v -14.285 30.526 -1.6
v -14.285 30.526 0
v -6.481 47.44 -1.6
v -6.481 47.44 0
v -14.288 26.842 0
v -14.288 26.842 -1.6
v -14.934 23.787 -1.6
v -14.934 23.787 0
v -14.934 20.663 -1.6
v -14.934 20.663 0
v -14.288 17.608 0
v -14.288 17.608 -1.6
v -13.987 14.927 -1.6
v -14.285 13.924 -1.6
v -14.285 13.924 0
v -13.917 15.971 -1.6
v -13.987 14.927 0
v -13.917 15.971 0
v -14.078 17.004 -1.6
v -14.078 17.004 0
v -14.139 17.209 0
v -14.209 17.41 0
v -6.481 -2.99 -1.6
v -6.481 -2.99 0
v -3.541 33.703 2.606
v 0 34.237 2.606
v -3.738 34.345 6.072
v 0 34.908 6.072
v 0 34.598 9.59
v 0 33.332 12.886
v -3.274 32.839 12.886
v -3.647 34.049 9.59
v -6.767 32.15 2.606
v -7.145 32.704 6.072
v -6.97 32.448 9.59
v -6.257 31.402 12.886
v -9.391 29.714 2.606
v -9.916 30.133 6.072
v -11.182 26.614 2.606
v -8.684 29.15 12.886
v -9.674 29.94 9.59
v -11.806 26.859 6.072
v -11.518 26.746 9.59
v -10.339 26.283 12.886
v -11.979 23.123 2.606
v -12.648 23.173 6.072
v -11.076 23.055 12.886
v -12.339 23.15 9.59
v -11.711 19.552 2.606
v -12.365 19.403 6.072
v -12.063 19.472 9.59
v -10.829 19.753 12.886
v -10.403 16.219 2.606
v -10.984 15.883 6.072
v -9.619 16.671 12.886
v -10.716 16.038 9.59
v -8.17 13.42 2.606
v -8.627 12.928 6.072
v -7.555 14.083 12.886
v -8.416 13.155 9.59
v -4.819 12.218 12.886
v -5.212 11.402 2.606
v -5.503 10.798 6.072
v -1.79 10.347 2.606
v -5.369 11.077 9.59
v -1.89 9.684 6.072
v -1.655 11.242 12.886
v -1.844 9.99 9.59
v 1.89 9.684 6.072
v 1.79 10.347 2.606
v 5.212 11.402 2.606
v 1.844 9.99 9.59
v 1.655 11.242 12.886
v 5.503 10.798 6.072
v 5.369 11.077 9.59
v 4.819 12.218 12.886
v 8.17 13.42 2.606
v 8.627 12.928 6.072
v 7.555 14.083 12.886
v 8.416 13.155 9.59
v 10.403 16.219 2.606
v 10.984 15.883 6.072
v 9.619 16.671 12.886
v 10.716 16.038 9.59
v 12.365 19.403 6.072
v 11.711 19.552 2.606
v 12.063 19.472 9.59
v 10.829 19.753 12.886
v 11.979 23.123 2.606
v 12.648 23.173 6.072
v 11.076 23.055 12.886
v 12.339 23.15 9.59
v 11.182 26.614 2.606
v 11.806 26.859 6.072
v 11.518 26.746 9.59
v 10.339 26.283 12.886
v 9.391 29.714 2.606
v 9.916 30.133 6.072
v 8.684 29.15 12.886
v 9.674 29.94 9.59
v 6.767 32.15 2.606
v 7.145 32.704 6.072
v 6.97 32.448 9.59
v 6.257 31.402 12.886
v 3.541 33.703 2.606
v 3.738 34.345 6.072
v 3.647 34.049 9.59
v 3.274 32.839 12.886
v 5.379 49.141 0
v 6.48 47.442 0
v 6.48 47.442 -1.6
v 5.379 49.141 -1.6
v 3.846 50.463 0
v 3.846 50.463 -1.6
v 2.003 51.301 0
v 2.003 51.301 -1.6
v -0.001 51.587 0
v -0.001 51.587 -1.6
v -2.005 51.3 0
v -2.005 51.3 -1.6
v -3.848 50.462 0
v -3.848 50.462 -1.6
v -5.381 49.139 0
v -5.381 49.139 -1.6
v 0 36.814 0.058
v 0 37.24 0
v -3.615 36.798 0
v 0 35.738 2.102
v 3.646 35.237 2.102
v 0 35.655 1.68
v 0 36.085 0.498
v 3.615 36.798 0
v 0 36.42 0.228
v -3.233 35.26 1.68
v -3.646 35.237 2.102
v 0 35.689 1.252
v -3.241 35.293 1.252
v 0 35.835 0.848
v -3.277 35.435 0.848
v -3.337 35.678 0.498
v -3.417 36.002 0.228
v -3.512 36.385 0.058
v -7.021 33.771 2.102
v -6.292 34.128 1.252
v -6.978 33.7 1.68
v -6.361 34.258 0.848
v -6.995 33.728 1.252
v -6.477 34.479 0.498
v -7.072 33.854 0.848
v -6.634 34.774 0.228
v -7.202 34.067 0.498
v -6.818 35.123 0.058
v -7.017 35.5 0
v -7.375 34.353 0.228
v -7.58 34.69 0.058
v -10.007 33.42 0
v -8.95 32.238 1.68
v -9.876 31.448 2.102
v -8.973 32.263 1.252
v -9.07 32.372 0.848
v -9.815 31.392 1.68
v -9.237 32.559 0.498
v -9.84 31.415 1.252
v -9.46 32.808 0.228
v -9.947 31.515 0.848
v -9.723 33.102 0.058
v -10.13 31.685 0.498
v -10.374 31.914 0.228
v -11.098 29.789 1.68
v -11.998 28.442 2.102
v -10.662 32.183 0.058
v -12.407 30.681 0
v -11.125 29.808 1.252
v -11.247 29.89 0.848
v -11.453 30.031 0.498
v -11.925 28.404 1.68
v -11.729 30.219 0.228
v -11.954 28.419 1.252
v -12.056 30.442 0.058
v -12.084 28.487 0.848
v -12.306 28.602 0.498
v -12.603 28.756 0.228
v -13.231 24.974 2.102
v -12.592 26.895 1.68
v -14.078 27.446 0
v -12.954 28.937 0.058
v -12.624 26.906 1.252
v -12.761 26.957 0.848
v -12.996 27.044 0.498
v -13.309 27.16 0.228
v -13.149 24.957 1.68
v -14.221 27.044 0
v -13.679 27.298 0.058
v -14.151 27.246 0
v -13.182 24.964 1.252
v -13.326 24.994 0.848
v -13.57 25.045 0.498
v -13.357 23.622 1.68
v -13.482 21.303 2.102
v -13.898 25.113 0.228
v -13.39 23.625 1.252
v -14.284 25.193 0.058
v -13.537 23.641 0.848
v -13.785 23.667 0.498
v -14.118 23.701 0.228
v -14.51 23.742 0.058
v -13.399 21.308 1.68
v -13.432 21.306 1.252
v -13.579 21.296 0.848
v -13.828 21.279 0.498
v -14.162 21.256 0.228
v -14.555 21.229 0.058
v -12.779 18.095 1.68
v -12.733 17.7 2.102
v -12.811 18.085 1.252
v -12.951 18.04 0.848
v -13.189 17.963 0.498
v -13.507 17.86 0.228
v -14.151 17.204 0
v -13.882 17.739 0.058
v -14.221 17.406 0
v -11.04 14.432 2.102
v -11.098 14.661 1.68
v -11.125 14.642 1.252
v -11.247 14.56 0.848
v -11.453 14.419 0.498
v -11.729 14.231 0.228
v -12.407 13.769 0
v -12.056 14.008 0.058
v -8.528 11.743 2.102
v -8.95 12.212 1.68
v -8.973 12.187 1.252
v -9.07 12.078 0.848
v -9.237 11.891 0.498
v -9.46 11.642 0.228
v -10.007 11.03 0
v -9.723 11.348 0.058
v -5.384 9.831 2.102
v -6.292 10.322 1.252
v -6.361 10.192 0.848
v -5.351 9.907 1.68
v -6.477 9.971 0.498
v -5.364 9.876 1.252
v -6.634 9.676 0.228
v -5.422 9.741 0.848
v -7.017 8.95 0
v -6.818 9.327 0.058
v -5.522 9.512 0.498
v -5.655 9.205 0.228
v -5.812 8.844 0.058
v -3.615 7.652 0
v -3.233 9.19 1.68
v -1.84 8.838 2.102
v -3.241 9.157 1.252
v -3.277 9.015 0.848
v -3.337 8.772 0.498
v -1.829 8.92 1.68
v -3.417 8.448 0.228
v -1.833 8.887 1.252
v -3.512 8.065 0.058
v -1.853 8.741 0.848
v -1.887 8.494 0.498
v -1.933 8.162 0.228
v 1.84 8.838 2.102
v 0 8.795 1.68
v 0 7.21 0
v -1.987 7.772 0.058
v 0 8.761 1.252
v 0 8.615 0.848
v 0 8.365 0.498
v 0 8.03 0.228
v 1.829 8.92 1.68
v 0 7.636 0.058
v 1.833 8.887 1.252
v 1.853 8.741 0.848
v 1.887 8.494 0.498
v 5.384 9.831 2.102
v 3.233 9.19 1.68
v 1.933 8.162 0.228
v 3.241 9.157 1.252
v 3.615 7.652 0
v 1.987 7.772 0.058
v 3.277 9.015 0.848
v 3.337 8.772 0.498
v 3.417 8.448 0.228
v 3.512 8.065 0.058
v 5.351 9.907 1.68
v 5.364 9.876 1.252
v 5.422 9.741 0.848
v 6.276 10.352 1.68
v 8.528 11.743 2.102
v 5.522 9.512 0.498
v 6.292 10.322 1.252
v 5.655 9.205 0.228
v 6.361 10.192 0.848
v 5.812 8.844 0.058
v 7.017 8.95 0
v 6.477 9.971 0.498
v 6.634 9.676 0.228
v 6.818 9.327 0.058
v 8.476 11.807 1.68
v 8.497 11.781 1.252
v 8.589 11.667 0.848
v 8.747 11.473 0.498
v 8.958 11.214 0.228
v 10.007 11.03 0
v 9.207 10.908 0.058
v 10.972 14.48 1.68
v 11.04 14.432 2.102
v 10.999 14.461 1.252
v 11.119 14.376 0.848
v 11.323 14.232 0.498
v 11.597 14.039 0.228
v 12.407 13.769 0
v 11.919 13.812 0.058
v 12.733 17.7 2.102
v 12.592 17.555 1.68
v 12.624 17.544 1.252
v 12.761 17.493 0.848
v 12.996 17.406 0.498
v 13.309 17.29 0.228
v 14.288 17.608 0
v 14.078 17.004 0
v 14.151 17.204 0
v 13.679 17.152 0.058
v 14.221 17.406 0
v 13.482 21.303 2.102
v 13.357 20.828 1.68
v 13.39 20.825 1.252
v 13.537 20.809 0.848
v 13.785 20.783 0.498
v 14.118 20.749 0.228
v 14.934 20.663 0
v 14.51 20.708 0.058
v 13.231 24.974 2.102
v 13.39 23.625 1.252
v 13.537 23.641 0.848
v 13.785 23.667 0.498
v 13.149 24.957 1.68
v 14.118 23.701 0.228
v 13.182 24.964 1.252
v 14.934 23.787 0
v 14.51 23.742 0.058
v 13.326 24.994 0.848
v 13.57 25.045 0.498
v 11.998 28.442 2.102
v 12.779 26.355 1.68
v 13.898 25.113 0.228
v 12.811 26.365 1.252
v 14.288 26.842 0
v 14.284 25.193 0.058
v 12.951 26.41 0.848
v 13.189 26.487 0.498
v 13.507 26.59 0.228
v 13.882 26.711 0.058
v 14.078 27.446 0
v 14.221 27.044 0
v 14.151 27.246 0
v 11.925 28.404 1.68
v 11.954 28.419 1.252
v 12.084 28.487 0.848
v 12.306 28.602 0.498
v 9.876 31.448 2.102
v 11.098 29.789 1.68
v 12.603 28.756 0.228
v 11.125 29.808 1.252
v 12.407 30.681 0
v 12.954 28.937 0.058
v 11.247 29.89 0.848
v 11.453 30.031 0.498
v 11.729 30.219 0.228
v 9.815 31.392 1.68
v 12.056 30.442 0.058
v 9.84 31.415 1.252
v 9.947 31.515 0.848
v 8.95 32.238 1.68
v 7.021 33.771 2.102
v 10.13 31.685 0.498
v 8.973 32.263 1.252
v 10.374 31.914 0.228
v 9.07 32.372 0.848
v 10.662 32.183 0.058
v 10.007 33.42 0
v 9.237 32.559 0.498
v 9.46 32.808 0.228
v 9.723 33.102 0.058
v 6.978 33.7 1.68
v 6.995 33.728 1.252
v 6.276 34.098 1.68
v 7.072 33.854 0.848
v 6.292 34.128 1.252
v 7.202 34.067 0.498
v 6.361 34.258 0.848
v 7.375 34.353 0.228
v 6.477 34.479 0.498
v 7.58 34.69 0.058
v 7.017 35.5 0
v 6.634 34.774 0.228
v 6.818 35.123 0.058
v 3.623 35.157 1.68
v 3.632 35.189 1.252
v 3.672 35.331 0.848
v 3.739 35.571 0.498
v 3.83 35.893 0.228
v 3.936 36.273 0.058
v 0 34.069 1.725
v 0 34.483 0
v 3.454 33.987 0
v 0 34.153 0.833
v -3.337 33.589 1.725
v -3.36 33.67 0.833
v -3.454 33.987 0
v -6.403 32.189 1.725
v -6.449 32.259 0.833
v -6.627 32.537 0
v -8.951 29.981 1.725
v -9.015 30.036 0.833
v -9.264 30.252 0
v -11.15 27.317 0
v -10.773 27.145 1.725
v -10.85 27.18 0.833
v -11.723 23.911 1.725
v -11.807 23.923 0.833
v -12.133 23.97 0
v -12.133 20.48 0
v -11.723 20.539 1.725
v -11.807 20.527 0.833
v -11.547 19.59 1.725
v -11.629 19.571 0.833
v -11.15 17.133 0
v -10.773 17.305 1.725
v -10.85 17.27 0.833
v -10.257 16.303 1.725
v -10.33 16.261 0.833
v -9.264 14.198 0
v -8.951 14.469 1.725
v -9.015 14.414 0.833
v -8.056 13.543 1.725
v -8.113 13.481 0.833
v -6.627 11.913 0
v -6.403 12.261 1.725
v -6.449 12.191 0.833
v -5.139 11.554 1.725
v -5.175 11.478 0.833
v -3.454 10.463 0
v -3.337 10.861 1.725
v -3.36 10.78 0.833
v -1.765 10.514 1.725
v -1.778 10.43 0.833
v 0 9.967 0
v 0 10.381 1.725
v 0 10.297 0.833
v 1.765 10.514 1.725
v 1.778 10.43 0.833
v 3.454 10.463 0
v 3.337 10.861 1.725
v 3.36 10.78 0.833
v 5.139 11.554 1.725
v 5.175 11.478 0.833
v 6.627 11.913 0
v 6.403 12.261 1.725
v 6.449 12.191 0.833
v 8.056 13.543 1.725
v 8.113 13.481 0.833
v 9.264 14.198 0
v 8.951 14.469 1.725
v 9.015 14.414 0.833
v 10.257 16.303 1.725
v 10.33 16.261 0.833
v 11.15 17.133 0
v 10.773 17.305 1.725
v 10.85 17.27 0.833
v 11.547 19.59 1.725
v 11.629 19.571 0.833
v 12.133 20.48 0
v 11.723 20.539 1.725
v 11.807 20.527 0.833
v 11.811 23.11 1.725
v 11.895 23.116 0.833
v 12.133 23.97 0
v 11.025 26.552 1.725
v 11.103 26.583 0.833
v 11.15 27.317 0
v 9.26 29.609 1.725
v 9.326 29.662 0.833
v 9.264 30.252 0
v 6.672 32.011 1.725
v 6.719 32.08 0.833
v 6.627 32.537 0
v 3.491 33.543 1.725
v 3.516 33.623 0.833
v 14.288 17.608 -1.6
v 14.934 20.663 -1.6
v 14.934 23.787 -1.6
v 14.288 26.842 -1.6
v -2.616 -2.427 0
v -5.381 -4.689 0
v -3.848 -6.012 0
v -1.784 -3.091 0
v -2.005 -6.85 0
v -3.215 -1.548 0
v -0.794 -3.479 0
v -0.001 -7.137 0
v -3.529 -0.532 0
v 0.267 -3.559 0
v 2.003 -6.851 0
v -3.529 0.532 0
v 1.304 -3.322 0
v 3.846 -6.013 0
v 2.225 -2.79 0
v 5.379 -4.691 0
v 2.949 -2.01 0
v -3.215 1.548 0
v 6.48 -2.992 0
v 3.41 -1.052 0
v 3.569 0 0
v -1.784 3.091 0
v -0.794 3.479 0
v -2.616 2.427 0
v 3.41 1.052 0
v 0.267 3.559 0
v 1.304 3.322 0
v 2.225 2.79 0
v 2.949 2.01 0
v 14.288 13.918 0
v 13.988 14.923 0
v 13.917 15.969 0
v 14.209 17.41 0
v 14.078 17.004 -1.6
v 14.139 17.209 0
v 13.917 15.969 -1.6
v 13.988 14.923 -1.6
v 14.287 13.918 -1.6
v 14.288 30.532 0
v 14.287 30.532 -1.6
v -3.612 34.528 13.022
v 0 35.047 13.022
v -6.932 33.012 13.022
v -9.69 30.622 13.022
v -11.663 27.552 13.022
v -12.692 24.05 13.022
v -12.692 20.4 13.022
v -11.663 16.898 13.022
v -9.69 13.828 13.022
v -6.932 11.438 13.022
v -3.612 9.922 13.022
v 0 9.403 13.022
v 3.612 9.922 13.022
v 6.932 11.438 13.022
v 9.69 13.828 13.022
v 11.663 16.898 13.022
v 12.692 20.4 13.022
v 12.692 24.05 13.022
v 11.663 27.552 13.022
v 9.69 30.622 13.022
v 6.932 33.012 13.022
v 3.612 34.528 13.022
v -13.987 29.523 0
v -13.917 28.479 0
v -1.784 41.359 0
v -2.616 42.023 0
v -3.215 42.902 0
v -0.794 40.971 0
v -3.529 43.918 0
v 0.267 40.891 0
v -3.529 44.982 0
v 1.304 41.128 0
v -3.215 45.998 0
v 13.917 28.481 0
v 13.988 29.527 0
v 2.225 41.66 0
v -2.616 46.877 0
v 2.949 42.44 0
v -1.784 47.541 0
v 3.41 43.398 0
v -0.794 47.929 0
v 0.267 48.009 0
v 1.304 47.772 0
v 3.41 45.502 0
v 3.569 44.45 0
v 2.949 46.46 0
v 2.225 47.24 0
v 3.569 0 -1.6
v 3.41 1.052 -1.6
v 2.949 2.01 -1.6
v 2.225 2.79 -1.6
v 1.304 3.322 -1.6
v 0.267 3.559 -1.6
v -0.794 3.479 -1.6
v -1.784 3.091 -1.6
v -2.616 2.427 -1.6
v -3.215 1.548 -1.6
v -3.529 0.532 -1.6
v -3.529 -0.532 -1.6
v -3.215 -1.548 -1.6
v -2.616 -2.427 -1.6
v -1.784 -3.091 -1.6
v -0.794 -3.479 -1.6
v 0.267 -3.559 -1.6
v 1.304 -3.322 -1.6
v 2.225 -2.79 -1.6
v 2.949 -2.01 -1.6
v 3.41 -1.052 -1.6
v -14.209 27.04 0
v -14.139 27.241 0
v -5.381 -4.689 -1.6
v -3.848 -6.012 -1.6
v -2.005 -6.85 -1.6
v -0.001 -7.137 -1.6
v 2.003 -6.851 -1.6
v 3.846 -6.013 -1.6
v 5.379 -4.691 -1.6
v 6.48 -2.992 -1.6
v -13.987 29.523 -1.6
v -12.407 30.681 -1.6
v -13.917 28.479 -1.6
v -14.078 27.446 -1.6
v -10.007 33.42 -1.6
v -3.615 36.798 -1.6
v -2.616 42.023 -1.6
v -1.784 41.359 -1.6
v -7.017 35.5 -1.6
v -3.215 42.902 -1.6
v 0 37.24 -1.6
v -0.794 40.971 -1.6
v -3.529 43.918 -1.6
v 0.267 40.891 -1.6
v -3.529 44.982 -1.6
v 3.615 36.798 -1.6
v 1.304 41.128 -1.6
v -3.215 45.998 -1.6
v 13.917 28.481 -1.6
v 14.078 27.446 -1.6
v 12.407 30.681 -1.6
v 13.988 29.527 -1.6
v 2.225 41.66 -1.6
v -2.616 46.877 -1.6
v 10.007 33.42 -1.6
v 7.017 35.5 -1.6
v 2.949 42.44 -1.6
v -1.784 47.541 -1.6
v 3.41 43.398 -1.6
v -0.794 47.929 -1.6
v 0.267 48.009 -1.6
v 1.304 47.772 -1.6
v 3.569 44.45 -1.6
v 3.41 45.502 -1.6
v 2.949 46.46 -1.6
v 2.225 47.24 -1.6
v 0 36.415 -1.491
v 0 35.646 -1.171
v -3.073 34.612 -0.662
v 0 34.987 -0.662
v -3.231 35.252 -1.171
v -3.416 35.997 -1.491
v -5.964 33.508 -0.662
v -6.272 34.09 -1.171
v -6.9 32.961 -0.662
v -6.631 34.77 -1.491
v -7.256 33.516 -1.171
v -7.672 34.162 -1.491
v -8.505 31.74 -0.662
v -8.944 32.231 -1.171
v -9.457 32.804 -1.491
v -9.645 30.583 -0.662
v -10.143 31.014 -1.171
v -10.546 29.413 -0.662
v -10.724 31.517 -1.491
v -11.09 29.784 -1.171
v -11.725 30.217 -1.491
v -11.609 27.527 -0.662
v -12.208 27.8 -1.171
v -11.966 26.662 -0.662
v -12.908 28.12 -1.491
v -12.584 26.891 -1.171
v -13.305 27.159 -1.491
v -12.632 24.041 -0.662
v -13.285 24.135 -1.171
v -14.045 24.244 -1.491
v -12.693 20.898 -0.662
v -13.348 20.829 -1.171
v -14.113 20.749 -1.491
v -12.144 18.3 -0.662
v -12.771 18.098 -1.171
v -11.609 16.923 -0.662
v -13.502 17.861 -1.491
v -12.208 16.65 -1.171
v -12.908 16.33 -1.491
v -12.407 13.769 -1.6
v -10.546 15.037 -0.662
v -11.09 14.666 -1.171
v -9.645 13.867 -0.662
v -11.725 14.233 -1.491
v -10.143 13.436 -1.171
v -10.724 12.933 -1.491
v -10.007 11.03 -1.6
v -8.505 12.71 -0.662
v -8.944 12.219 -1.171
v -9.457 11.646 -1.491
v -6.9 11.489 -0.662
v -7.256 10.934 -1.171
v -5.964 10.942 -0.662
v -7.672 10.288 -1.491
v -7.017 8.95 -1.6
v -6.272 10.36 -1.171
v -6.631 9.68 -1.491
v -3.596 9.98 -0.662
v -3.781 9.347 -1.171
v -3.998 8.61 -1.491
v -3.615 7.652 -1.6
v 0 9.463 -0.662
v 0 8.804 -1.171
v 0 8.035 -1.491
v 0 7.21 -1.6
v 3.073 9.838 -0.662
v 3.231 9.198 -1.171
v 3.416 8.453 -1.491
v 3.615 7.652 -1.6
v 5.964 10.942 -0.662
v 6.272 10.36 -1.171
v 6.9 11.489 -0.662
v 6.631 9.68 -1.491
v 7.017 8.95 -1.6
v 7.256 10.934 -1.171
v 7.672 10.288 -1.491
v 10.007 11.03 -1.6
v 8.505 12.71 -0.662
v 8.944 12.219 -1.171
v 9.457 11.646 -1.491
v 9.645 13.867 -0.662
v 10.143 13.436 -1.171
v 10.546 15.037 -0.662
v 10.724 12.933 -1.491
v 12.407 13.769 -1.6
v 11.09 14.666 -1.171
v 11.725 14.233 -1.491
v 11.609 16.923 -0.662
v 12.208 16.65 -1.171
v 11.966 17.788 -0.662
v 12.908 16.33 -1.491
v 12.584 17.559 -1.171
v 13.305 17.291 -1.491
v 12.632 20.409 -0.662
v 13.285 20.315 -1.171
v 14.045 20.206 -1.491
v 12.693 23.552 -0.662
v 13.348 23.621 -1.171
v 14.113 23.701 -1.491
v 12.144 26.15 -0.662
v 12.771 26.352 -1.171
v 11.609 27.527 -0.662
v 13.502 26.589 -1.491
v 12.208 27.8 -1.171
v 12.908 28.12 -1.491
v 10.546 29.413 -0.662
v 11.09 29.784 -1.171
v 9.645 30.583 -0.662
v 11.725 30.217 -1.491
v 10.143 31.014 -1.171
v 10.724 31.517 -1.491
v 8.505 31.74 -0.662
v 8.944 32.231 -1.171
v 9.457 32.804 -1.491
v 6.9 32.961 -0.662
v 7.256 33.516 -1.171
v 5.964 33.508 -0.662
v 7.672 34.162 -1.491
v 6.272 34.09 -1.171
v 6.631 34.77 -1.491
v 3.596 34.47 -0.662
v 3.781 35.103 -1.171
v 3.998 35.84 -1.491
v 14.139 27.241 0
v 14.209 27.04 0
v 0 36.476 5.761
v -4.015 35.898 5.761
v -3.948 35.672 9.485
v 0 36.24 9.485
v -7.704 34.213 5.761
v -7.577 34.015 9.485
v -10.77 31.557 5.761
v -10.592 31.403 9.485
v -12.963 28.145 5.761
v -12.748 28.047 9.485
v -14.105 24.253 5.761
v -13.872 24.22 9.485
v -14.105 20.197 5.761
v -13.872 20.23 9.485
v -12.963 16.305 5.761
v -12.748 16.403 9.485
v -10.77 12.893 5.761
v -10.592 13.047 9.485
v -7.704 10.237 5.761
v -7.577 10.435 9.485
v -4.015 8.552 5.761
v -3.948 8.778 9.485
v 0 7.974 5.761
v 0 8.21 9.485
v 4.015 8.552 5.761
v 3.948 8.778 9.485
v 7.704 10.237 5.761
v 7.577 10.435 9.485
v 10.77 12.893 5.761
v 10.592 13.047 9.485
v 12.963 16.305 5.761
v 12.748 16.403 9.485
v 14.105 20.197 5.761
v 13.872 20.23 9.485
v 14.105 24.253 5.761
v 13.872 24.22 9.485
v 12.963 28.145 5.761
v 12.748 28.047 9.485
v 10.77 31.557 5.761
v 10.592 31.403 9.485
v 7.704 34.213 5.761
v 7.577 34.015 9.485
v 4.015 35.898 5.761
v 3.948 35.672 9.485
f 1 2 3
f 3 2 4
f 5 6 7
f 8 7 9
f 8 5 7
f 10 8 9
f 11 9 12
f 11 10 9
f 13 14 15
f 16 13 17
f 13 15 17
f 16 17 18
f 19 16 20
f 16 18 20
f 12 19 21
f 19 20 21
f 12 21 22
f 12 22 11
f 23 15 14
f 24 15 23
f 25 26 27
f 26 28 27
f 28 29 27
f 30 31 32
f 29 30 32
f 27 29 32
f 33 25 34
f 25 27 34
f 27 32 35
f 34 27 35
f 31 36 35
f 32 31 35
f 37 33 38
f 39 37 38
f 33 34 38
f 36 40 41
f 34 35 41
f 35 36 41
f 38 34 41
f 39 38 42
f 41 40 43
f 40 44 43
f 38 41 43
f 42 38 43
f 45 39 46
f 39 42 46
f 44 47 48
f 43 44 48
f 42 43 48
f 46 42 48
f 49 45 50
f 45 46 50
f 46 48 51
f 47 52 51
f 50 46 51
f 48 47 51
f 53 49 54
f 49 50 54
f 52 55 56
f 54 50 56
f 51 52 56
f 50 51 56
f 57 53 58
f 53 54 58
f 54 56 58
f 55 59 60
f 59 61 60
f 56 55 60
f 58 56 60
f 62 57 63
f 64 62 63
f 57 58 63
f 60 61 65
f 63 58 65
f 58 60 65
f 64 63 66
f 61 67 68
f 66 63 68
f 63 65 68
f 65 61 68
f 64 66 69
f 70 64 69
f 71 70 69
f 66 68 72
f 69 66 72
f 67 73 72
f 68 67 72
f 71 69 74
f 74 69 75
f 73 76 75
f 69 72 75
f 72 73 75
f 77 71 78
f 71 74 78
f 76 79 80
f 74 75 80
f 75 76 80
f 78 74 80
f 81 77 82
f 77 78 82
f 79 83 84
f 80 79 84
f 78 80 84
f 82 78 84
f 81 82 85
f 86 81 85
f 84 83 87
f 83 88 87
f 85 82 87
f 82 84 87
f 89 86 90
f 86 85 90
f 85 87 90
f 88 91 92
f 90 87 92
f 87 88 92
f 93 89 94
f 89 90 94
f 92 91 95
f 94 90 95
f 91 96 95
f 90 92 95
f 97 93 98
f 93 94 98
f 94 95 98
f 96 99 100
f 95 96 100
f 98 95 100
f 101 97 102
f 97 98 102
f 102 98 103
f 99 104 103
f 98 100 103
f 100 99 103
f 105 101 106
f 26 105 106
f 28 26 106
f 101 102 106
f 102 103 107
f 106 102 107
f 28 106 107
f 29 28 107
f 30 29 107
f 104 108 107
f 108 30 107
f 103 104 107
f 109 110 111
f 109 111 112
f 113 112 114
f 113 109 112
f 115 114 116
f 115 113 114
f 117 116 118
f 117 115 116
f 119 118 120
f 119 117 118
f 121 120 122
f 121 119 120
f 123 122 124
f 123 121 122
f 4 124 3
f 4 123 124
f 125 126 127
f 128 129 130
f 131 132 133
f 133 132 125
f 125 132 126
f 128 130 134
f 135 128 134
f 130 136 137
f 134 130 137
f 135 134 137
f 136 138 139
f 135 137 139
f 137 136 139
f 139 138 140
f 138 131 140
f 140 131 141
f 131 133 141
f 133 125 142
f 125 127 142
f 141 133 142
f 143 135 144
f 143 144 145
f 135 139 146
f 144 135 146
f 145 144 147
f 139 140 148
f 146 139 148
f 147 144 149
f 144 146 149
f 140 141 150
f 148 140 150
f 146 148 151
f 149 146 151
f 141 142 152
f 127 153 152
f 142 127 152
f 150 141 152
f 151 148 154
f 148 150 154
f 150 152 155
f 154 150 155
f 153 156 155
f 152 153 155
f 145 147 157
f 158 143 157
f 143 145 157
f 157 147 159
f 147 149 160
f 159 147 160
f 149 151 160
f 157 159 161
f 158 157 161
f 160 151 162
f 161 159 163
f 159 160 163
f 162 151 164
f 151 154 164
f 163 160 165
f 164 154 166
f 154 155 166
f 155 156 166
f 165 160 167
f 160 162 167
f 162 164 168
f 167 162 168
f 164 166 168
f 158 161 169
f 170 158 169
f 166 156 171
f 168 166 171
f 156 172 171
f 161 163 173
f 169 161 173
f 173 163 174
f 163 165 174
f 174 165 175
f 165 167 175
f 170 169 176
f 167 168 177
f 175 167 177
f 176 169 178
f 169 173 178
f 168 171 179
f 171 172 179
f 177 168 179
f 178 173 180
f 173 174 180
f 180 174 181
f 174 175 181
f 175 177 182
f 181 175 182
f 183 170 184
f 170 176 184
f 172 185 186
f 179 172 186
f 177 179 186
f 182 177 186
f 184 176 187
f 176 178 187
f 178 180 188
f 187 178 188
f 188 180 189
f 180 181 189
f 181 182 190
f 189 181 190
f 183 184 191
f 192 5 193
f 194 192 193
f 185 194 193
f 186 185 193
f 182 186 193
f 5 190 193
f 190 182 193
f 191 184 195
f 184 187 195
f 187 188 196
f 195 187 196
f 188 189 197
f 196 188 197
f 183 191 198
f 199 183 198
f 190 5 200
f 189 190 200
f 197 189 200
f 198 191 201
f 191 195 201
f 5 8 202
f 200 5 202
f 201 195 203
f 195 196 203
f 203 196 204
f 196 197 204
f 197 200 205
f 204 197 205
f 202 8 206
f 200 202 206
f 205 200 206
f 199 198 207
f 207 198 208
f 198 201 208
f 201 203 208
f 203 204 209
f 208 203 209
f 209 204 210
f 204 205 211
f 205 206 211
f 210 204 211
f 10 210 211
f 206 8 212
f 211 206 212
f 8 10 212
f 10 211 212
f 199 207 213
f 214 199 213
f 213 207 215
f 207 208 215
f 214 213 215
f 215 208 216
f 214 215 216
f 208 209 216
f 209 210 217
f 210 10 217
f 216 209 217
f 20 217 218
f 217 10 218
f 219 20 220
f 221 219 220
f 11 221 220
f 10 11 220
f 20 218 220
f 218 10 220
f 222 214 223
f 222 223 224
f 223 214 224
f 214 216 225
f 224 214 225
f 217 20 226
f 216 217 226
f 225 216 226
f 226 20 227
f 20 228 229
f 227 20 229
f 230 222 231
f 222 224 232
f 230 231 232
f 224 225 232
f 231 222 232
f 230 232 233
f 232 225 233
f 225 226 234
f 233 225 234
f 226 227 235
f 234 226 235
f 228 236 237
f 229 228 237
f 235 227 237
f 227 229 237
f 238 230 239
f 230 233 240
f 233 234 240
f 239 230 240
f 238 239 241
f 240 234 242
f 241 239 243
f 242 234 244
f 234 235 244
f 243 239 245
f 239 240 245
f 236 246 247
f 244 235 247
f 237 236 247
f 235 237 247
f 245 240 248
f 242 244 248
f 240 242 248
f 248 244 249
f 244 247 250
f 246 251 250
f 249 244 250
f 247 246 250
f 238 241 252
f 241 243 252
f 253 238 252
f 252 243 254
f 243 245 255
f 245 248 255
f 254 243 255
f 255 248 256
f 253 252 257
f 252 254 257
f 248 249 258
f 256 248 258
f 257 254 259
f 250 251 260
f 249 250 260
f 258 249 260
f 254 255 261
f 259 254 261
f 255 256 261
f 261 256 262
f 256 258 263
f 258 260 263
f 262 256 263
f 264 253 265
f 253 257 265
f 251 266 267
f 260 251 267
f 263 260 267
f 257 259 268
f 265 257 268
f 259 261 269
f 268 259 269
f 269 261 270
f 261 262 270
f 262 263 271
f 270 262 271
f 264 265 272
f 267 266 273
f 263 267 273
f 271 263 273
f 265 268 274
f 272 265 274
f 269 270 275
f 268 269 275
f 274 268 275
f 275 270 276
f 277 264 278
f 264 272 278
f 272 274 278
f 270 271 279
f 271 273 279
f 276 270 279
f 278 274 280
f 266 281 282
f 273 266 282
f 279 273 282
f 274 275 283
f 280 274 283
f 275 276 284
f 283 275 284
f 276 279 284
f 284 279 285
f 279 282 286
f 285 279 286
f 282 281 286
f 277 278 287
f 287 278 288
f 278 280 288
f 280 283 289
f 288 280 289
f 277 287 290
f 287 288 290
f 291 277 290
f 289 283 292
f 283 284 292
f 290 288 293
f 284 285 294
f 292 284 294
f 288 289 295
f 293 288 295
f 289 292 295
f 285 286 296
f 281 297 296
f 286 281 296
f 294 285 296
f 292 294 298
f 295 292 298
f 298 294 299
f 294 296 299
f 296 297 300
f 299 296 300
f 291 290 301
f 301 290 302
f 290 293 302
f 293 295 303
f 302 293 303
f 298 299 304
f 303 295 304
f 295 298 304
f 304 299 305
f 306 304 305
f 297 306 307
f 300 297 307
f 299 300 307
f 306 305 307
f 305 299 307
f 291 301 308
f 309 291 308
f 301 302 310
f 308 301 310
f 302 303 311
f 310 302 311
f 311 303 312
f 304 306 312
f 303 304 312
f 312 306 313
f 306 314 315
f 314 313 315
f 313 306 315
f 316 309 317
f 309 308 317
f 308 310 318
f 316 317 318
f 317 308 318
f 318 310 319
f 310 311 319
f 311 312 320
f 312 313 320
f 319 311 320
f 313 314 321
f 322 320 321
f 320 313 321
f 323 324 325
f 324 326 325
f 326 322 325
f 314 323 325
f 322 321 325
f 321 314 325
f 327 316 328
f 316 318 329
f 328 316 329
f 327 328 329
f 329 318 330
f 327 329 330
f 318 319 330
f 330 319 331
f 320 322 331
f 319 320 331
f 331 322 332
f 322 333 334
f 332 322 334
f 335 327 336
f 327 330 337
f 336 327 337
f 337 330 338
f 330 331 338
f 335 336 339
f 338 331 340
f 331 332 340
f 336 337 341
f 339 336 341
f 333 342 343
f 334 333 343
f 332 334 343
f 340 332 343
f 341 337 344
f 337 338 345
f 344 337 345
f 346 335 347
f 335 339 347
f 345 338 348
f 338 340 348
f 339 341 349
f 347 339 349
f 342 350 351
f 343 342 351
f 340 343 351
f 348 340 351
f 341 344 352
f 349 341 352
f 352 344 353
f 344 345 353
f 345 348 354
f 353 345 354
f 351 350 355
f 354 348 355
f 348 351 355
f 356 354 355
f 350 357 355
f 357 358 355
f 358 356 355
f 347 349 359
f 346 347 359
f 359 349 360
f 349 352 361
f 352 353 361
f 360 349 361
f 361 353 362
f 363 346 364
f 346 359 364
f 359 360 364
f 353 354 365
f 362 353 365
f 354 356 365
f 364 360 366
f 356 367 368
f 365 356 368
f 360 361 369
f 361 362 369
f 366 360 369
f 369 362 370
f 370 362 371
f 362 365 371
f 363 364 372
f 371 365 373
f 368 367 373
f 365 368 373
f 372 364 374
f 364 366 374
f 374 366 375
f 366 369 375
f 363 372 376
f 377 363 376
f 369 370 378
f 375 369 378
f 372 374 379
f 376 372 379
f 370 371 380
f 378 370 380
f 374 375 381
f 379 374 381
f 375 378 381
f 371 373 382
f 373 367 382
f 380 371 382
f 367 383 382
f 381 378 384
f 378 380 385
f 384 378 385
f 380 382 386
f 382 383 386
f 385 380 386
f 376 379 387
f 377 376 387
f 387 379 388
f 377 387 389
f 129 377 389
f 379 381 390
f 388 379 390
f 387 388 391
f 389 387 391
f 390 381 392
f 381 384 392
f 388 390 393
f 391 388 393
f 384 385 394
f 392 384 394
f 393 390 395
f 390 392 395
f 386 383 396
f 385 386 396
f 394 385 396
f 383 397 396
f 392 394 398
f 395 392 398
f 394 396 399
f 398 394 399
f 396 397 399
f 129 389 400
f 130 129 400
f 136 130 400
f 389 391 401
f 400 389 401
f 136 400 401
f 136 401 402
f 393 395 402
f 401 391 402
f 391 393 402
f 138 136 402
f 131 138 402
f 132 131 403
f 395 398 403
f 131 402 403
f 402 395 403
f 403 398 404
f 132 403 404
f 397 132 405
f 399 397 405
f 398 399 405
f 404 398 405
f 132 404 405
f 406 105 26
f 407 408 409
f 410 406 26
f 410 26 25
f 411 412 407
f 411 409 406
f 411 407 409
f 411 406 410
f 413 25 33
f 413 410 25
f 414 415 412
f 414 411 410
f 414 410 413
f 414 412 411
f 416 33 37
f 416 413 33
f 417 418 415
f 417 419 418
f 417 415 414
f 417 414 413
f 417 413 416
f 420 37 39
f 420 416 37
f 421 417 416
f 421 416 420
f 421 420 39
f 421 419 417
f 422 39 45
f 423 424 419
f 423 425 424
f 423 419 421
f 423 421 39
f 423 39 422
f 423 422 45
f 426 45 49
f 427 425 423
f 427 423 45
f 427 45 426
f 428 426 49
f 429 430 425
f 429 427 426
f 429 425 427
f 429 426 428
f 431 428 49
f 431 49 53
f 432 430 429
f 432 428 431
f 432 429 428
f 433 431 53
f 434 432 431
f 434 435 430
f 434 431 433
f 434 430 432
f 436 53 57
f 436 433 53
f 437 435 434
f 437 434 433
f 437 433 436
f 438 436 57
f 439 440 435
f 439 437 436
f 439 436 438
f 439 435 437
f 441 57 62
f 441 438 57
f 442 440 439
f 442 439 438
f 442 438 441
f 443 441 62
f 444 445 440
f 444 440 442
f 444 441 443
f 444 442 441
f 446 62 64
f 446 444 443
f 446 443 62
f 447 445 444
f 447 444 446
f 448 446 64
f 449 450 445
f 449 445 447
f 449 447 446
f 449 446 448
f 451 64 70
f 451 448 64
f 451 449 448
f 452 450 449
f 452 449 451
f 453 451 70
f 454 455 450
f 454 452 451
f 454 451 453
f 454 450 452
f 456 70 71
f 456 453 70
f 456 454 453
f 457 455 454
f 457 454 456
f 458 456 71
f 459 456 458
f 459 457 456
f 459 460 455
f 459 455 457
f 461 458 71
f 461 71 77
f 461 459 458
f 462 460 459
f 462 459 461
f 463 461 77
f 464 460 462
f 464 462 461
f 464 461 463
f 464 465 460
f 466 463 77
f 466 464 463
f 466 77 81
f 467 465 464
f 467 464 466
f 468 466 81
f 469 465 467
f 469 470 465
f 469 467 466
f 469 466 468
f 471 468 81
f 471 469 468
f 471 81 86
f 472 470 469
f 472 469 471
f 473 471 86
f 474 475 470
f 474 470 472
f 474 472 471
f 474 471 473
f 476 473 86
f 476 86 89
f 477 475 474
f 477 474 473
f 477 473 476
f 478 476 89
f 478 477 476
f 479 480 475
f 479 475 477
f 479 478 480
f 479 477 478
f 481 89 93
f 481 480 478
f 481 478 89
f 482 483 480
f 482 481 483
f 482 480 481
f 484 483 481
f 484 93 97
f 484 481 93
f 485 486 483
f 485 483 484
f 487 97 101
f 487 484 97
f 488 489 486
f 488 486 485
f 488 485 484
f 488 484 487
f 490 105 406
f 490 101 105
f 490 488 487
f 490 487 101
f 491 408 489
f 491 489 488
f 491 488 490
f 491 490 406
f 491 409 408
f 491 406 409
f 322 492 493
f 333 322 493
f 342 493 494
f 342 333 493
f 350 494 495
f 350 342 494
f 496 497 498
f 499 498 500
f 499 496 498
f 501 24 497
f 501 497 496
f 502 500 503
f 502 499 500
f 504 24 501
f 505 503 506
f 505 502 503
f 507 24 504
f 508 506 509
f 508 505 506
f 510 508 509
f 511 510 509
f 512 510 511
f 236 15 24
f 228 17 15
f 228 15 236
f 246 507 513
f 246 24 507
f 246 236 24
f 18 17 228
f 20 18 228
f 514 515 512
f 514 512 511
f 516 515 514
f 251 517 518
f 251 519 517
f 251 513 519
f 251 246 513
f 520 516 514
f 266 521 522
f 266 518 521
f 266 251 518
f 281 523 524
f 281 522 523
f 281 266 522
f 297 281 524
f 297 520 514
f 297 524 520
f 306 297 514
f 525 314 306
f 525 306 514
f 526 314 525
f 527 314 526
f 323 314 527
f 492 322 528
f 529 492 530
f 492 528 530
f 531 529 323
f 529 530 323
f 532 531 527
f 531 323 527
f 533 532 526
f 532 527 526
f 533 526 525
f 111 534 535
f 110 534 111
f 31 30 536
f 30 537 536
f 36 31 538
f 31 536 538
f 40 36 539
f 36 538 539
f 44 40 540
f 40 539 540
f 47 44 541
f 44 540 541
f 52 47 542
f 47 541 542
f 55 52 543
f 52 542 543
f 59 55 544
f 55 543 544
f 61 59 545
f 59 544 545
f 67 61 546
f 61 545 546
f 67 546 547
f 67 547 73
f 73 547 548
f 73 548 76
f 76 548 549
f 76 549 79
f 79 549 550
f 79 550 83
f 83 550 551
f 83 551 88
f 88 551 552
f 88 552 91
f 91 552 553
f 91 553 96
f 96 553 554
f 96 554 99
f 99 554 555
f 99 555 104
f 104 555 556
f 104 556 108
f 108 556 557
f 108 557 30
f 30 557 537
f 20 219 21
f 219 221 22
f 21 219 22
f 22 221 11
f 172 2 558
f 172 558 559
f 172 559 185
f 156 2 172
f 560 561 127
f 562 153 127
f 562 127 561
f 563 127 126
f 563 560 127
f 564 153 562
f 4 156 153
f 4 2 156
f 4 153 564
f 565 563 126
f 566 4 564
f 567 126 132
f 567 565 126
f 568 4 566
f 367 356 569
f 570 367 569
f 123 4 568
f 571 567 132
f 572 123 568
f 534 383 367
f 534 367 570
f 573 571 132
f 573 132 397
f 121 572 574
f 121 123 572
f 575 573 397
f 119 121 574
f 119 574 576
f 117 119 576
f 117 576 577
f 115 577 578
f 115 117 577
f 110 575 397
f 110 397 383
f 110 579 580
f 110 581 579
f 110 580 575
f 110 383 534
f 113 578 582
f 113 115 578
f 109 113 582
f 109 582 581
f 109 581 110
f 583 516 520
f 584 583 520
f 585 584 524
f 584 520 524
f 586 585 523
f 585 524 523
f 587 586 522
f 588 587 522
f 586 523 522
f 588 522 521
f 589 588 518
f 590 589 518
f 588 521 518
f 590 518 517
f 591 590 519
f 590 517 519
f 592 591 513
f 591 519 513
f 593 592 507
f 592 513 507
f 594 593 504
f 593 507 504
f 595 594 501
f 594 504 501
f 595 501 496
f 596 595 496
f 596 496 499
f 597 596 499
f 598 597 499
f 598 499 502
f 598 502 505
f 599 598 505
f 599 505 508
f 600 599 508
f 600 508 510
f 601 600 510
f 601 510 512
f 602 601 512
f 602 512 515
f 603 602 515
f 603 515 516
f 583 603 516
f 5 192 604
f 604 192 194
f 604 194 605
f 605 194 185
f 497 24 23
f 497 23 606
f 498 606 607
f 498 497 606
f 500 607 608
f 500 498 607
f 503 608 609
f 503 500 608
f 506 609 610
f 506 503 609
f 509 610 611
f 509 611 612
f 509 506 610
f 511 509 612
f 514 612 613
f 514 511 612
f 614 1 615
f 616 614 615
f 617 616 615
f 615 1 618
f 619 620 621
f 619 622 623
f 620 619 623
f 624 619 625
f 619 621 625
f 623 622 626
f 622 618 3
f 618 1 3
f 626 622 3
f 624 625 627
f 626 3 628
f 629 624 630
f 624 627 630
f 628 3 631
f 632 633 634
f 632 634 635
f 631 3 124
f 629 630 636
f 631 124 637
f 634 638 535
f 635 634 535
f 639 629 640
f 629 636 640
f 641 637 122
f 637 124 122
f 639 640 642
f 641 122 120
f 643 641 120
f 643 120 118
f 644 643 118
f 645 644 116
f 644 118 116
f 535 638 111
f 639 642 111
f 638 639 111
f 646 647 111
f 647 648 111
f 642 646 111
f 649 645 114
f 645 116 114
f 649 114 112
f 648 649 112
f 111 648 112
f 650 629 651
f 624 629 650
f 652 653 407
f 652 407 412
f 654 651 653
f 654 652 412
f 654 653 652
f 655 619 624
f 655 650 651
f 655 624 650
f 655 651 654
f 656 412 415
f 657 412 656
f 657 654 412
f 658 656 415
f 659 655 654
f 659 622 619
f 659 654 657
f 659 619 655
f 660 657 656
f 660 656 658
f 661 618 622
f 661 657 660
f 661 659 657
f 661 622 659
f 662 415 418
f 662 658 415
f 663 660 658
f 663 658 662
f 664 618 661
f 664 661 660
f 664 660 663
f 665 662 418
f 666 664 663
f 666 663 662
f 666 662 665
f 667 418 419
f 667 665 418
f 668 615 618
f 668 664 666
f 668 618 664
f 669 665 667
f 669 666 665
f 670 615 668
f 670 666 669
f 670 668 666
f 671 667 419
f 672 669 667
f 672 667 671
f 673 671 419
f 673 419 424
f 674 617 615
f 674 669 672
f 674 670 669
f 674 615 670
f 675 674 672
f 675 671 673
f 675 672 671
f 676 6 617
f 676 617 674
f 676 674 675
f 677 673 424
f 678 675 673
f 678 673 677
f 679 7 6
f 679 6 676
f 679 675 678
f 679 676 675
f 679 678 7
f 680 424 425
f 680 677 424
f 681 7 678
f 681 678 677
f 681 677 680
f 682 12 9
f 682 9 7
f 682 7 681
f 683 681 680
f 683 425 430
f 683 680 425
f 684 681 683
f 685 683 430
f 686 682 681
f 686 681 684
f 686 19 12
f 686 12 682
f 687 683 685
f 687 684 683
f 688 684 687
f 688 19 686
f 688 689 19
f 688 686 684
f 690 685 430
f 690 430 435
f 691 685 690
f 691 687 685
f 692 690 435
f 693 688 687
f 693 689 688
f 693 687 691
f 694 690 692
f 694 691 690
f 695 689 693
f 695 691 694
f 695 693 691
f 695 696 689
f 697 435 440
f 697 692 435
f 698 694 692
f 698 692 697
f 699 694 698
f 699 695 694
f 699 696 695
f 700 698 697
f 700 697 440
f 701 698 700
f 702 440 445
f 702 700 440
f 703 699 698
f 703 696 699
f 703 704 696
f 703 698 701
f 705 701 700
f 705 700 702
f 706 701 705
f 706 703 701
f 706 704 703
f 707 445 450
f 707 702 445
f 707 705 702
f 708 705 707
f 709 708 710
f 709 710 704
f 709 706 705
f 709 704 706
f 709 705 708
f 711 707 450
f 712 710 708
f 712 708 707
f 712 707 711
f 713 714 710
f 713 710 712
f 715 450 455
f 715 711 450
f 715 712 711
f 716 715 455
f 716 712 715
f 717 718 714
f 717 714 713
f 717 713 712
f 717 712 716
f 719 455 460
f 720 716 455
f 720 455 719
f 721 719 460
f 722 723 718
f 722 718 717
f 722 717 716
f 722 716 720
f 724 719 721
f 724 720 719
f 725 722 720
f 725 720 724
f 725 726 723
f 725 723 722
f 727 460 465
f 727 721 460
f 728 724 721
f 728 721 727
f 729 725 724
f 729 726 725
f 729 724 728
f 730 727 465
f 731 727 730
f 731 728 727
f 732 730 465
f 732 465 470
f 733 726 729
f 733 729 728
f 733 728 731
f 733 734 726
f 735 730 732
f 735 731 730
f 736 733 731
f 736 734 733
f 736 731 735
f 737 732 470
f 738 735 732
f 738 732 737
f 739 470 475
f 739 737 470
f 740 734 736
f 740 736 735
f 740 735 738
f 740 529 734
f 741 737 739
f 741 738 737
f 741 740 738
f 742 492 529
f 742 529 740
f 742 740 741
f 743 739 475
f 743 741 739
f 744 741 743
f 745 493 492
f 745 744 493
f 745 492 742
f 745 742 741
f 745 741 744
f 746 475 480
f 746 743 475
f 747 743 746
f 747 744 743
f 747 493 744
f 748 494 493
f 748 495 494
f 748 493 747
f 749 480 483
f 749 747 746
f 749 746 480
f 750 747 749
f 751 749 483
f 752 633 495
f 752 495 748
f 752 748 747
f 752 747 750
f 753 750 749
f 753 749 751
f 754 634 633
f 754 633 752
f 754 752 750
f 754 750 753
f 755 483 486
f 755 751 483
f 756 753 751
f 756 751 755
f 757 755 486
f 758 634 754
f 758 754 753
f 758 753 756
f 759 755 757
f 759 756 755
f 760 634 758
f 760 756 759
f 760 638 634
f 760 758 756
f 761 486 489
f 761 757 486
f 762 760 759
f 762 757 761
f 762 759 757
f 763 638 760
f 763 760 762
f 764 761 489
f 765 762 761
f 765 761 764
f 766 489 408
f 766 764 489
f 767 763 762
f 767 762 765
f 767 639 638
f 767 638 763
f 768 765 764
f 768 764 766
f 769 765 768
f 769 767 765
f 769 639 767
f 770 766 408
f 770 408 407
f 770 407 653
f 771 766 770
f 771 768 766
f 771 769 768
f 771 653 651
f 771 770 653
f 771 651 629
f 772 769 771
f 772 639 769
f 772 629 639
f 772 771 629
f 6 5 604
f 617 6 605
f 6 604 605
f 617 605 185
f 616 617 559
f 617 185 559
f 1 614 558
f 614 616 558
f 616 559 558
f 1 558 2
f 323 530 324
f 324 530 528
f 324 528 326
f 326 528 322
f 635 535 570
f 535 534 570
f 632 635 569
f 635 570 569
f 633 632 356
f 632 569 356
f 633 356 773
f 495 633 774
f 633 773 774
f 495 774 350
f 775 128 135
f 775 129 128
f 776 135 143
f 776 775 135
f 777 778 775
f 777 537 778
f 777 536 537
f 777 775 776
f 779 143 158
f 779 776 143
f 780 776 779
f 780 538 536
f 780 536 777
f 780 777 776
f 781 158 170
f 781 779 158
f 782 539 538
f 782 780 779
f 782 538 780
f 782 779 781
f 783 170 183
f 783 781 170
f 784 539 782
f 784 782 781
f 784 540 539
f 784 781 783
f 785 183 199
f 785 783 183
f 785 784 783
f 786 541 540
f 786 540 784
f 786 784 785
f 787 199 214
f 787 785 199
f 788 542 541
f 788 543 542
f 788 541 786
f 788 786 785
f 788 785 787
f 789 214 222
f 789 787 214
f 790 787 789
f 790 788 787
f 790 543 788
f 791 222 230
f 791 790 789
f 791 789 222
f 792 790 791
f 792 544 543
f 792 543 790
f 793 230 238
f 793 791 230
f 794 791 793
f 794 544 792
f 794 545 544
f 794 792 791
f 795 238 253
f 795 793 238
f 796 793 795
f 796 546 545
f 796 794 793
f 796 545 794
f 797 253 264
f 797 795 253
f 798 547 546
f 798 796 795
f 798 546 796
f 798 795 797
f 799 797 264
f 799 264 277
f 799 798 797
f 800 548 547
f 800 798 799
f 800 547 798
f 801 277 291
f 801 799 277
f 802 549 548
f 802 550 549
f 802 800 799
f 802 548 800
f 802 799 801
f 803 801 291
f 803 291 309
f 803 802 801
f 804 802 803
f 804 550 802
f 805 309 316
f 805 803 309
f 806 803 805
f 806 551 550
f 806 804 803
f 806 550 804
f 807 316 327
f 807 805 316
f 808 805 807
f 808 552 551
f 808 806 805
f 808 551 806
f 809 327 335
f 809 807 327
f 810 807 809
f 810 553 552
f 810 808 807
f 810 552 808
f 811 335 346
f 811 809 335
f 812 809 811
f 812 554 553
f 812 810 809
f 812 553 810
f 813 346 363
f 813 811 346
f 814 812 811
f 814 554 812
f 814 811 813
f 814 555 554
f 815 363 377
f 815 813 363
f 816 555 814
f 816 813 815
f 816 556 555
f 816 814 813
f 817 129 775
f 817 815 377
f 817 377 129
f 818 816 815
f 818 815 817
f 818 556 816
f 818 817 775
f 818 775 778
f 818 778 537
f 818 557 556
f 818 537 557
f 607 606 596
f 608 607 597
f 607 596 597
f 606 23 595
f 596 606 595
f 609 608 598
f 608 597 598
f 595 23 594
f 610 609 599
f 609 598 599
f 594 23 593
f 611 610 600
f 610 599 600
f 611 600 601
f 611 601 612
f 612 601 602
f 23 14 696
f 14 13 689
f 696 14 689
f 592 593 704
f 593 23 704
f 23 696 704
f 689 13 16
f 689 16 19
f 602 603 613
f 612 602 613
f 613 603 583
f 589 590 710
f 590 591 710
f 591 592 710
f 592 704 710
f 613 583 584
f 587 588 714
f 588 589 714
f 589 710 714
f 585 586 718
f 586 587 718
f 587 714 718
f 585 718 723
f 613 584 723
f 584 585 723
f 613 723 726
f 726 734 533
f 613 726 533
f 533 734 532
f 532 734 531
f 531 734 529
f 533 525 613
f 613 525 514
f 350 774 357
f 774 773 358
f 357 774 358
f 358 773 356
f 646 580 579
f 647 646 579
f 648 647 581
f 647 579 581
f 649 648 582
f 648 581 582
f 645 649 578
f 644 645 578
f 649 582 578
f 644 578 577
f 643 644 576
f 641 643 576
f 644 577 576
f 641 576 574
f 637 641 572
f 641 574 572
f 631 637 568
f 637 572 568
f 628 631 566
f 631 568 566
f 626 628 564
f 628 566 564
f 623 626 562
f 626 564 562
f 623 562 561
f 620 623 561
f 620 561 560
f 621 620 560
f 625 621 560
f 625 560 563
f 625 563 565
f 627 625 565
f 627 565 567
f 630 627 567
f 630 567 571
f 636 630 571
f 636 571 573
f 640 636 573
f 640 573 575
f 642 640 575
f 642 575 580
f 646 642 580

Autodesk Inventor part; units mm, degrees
ref_plane "YZ Plane" through (0, 0, 0) normal (1, 0, 0) x (0, 1, 0)
ref_plane "XZ Plane" through (0, 0, 0) normal (0, 1, 0) x (-1, 0, 0)
ref_plane "XY Plane" through (0, 0, 0) normal (0, 0, 1) x (1, 0, 0)
sketch "Sketch1" plane through (0, 0, 0) normal (0, 0, 1) x (1, 0, 0)
  circle A0 centre (0, 0) radius 3.5687
  arc A1 (-6.4809, -2.9901) -> (6.4801, -2.9918) centre (0, 0) ccw
  line L0 (-20.3315, 22.225) -> (23.7148, 22.225)
  circle A2 centre (0, 44.45) radius 3.5687
  arc A3 (6.4801, 47.4418) -> (-6.4809, 47.4401) centre (0, 44.45) ccw
  circle A4 centre (0, 22.225) radius 14.8487
  circle A5 centre (0, 22.225) radius 13.5003
  line L1 (-18.1146, 22.225) -> (-6.4809, 47.4401)
  line L2 (18.1226, 22.225) -> (6.4801, 47.4418)
  line L3 (-18.1146, 22.225) -> (-6.4809, -2.9901)
  line L4 (18.1226, 22.225) -> (6.4801, -2.9918)
  point P0 (-14.3353, 14.0338)
  point P1 (14.3408, 14.0338)
  dimension "d0" = 7.1374
  dimension "d1" = 14.2748
  dimension "d2" = 44.45
extrude "Extrusion1" add sketch "Sketch1" against normal blind 1.6002
sketch "Sketch2" plane through (0, 0, 0) normal (1, 0, 0) x (0, 1, 0)
  point P0 (0, 0)
sketch "Sketch3" plane through (0, 0, 0) normal (1, 0, 0) x (0, 1, 0)
  arc A0 (35.7382, 2.1018) -> (35.0472, 13.022) centre (22.225, 6.7287) ccw
  line L0 (51.5874, 0) -> (47.4401, 0) projected
  line L1 (51.5874, 0) -> (34.4832, 0)
  line L2 (-2.9901, 0) -> (-7.1374, 0) projected
  line L3 (-7.1374, 0) -> (7.1476, 1.1293)
  line L4 (33.3323, 12.8864) -> (35.0472, 13.022)
  arc A1 (35.7382, 2.1018) -> (37.2401, 0) centre (37.2401, 1.5875) ccw
  line L5 (48.0187, -1.6002) -> (40.8813, -1.6002) projected
  line L6 (3.5687, -1.6002) -> (-3.5687, -1.6002) projected
  line L7 (22.225, -1.6002) -> (-2.9901, -1.6002) projected
  line L8 (47.4401, -1.6002) -> (22.225, -1.6002) projected
  line L9 (47.4418, -1.6002) -> (47.4401, -1.6002) projected
  line L10 (22.225, -1.6002) -> (47.4418, -1.6002) projected
  line L11 (-2.9918, -1.6002) -> (22.225, -1.6002) projected
  line L12 (-2.9901, -1.6002) -> (-2.9918, -1.6002) projected
  arc A2 (34.2371, 2.6056) -> (33.3323, 12.8864) centre (22.225, 6.7287) ccw
  line L13 (51.5874, -1.6002) -> (47.4401, -1.6002) projected
  line L14 (51.5874, -1.6002) -> (37.2401, -1.6002)
  arc A3 (34.2371, 2.6056) -> (34.4832, 0) centre (37.2401, 1.5748) ccw
  line L15 (22.225, -1.6002) -> (22.225, 16.2984)
  arc A4 (34.4832, 0) -> (37.2401, -1.6002) centre (37.2401, 1.5748) ccw
  line L16 (37.2401, -1.6002) -> (22.225, -1.6002)
  line L17 (34.4832, 0) -> (22.225, 0)
  point P0 (0, 0)
  point P1 (47.4418, 0)
  point P2 (-2.9918, 0)
  point P3 (31.8125, -1.6002)
  dimension "d28" = 1.5875
  dimension "d29" = 3.175
revolve "Revolution2" add sketch "Sketch3" angle 360 about axis through (0, 22.225, -1.6002) along (0, 0, 1) contours A1 L1 A3 A2 L4 A0
revolve "Revolution3" cut sketch "Sketch3" angle 360 about axis through (0, 22.225, -1.6002) along (0, 0, 1) contours A4 L8 L15 L17
sketch "Sketch4" plane through (0, 0, 0) normal (0, 0, 1) x (1, 0, 0)
  line L0 (6.4801, -2.9918) -> (18.1226, 22.225) projected
  line L1 (18.1226, 22.225) -> (6.4801, 47.4418) projected
  circle A0 centre (0, 44.45) radius 3.5687 projected
  circle A1 centre (0, 22.225) radius 15.0151 projected
  line L2 (0, 44.45) -> (0, 57.4596)
  line L3 (-14.2875, 44.45) -> (-14.2875, 57.4596)
  arc A2 (14.2875, 30.5316) -> (14.2875, 26.8424) centre (18.632, 28.687) ccw
  arc A3 (14.2875, 17.6076) -> (14.2875, 26.8424) centre (0, 22.225) ccw
  arc A4 (14.2875, 17.6076) -> (14.2875, 13.9184) centre (18.632, 15.763) ccw
  line L4 (14.2875, 30.5316) -> (14.2875, 57.4596)
  dimension "d33" = 14.2875
extrude "Extrusion2" cut sketch "Sketch4" against normal up to next contours A4 A1 A2 L1 L0 | A4 A1 | A1 A2
mirror "Mirror1" about plane through (0, 0, 0) normal (1, 0, 0) of "Extrusion2"
equation "\"d33\" = 0.5 * d32"
equation "\"d32\" = 28.575"
properties part number "Misc_FlangeMount_Triangle_4050"
